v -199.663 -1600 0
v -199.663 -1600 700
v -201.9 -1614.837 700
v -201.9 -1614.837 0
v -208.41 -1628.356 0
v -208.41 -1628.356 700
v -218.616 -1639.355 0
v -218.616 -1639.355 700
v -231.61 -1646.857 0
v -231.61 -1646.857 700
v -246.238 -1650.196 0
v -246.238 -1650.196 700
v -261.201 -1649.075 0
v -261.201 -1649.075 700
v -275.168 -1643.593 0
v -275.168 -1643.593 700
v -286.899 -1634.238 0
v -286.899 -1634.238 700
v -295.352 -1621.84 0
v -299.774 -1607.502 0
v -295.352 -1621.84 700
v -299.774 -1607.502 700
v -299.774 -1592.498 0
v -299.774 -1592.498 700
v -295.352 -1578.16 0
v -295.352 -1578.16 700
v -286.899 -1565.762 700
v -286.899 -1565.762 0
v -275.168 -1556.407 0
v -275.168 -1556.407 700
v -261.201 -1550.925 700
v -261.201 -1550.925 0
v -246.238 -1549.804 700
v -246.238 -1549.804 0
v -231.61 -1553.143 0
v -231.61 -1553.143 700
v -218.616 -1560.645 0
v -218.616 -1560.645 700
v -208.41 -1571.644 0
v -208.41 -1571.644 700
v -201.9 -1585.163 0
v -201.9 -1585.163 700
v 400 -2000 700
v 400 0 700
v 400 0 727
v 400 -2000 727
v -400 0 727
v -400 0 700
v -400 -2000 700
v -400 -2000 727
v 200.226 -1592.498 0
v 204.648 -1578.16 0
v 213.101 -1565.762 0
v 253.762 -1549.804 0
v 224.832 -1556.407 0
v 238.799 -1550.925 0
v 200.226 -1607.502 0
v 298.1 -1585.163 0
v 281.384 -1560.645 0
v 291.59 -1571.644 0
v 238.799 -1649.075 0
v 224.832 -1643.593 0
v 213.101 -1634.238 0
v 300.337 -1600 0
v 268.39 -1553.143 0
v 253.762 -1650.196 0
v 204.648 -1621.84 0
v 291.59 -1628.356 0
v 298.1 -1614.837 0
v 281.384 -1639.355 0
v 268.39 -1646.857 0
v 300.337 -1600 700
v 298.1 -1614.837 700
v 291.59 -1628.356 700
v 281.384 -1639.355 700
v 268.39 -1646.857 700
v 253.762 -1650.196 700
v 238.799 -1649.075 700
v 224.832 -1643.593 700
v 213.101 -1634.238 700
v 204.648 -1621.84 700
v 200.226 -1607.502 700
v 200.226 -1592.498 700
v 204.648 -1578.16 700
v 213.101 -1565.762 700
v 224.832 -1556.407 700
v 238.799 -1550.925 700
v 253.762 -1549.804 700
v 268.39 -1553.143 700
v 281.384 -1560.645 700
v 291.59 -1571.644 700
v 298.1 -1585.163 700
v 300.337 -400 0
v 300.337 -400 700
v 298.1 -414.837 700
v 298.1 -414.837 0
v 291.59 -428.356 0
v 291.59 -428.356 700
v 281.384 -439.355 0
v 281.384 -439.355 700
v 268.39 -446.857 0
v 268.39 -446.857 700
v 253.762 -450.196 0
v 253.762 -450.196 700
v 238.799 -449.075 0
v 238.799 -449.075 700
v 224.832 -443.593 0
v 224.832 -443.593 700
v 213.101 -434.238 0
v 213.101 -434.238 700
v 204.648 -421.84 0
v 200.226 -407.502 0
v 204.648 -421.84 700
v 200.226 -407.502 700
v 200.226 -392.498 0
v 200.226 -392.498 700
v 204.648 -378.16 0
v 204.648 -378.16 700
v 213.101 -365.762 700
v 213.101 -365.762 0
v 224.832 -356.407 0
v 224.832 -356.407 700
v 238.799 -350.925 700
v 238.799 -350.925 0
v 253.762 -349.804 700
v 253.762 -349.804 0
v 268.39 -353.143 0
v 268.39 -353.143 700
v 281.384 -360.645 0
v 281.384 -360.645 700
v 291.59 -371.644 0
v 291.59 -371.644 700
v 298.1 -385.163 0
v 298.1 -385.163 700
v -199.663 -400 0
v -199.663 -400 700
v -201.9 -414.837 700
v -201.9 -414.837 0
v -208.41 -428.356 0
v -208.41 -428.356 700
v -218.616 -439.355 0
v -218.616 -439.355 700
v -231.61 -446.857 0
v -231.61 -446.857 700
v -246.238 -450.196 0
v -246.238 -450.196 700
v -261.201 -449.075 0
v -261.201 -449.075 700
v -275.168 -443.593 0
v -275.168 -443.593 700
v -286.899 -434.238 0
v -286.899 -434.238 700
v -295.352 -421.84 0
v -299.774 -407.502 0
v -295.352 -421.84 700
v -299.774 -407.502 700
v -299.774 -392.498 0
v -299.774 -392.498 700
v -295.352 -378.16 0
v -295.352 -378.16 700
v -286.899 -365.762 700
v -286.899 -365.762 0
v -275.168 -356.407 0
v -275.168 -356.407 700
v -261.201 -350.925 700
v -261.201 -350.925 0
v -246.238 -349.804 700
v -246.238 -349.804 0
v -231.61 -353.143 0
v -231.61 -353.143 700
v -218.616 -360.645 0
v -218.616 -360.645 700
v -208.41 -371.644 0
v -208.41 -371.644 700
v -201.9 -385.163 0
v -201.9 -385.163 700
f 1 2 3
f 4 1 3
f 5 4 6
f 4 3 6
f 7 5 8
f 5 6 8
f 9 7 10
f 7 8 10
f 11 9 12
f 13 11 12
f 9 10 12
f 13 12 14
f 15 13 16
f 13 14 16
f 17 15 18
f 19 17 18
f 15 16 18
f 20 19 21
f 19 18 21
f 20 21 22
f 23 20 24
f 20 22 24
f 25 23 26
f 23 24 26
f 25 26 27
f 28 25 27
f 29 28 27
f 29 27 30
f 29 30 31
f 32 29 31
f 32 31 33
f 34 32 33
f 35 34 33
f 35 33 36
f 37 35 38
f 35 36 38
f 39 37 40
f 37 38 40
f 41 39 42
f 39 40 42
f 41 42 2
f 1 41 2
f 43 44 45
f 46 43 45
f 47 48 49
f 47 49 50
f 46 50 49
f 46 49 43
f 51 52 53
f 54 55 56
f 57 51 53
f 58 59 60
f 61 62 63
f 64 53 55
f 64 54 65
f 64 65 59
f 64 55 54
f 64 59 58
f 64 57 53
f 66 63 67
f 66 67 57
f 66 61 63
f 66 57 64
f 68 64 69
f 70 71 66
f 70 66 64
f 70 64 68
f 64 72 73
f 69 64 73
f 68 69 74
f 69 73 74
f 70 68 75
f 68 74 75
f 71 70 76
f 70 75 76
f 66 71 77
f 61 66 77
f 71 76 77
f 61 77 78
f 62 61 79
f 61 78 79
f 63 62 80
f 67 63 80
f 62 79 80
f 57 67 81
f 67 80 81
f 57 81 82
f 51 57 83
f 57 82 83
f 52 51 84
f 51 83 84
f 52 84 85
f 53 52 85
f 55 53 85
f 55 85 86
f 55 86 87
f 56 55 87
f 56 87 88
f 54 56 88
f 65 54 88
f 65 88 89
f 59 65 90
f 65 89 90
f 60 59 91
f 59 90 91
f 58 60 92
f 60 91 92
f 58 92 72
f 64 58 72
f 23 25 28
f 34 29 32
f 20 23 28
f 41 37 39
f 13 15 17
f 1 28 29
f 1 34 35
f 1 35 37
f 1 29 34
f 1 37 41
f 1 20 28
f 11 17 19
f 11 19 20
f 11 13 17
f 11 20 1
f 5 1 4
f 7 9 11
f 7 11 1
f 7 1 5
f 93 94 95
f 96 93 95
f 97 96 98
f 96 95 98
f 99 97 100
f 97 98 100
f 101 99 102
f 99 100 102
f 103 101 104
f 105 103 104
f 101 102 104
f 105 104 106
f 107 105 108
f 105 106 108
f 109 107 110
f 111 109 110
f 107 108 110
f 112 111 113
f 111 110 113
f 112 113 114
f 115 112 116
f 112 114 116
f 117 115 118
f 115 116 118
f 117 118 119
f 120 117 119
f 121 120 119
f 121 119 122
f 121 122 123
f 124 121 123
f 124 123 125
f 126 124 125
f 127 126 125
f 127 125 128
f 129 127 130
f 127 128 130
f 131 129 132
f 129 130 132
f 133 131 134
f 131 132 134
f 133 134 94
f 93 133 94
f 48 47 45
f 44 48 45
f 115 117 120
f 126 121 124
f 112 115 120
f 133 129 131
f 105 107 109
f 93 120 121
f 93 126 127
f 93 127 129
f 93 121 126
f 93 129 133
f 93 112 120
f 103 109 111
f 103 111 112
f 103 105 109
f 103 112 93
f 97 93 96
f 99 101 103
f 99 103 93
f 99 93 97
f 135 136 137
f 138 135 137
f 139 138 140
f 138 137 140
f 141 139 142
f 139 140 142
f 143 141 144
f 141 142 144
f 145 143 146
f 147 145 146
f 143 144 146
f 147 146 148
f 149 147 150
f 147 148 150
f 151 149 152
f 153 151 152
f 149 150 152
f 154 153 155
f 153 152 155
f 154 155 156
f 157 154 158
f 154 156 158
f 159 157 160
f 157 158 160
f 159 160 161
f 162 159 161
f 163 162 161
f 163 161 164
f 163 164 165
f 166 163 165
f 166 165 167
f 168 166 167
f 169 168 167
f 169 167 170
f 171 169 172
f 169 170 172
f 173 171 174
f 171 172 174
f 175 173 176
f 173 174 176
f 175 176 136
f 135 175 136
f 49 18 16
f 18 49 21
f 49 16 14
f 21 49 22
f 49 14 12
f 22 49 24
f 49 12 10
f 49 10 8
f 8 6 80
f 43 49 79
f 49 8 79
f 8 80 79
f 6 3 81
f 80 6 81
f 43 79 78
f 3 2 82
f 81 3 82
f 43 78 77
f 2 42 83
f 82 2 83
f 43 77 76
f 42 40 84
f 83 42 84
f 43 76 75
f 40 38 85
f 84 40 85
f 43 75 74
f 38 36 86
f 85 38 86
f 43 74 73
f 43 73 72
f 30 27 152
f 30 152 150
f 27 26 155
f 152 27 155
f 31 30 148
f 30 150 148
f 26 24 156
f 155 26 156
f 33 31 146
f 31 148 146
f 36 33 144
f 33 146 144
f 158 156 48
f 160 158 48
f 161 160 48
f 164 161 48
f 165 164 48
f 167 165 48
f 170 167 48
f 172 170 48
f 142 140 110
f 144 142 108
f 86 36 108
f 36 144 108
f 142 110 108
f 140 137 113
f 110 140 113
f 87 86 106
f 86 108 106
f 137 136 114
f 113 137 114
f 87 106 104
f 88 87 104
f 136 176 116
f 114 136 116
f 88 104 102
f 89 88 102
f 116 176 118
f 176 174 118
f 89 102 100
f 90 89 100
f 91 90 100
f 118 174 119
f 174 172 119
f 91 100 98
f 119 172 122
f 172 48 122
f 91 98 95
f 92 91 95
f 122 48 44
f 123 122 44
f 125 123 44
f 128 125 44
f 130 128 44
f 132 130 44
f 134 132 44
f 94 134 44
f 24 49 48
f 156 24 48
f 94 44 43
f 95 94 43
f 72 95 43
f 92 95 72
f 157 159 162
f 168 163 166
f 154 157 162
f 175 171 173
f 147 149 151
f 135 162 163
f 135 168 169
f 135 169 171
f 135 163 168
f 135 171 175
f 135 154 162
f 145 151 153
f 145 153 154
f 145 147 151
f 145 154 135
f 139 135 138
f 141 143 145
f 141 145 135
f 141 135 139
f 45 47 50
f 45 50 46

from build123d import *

# Parameters (mm, degrees)
F0_W     = 800
F0_H     = 27
F1_DEPTH = 2000
F2_R     = 50.336574
F3_DEPTH = 700


with BuildPart() as f1:
    # F0 (on Front) → F1 (new body)
    with BuildSketch(Plane.XZ):
        with Locations((0, 713.5)):
            Rectangle(F0_W, F0_H)
    extrude(amount=F1_DEPTH)

    # F2 (on face) → F3 (join)
    with BuildSketch(Plane(origin=(0, 0, 700), x_dir=(1, 0, 0), z_dir=(0, 0, -1))):
        with Locations((-250, 400)):
            Circle(F2_R)
        with Locations((-250, 1600)):
            Circle(F2_R)
        with Locations((250, 1600)):
            Circle(F2_R)
        with Locations((250, 400)):
            Circle(F2_R)
    extrude(amount=F3_DEPTH)


solid = f1.part
